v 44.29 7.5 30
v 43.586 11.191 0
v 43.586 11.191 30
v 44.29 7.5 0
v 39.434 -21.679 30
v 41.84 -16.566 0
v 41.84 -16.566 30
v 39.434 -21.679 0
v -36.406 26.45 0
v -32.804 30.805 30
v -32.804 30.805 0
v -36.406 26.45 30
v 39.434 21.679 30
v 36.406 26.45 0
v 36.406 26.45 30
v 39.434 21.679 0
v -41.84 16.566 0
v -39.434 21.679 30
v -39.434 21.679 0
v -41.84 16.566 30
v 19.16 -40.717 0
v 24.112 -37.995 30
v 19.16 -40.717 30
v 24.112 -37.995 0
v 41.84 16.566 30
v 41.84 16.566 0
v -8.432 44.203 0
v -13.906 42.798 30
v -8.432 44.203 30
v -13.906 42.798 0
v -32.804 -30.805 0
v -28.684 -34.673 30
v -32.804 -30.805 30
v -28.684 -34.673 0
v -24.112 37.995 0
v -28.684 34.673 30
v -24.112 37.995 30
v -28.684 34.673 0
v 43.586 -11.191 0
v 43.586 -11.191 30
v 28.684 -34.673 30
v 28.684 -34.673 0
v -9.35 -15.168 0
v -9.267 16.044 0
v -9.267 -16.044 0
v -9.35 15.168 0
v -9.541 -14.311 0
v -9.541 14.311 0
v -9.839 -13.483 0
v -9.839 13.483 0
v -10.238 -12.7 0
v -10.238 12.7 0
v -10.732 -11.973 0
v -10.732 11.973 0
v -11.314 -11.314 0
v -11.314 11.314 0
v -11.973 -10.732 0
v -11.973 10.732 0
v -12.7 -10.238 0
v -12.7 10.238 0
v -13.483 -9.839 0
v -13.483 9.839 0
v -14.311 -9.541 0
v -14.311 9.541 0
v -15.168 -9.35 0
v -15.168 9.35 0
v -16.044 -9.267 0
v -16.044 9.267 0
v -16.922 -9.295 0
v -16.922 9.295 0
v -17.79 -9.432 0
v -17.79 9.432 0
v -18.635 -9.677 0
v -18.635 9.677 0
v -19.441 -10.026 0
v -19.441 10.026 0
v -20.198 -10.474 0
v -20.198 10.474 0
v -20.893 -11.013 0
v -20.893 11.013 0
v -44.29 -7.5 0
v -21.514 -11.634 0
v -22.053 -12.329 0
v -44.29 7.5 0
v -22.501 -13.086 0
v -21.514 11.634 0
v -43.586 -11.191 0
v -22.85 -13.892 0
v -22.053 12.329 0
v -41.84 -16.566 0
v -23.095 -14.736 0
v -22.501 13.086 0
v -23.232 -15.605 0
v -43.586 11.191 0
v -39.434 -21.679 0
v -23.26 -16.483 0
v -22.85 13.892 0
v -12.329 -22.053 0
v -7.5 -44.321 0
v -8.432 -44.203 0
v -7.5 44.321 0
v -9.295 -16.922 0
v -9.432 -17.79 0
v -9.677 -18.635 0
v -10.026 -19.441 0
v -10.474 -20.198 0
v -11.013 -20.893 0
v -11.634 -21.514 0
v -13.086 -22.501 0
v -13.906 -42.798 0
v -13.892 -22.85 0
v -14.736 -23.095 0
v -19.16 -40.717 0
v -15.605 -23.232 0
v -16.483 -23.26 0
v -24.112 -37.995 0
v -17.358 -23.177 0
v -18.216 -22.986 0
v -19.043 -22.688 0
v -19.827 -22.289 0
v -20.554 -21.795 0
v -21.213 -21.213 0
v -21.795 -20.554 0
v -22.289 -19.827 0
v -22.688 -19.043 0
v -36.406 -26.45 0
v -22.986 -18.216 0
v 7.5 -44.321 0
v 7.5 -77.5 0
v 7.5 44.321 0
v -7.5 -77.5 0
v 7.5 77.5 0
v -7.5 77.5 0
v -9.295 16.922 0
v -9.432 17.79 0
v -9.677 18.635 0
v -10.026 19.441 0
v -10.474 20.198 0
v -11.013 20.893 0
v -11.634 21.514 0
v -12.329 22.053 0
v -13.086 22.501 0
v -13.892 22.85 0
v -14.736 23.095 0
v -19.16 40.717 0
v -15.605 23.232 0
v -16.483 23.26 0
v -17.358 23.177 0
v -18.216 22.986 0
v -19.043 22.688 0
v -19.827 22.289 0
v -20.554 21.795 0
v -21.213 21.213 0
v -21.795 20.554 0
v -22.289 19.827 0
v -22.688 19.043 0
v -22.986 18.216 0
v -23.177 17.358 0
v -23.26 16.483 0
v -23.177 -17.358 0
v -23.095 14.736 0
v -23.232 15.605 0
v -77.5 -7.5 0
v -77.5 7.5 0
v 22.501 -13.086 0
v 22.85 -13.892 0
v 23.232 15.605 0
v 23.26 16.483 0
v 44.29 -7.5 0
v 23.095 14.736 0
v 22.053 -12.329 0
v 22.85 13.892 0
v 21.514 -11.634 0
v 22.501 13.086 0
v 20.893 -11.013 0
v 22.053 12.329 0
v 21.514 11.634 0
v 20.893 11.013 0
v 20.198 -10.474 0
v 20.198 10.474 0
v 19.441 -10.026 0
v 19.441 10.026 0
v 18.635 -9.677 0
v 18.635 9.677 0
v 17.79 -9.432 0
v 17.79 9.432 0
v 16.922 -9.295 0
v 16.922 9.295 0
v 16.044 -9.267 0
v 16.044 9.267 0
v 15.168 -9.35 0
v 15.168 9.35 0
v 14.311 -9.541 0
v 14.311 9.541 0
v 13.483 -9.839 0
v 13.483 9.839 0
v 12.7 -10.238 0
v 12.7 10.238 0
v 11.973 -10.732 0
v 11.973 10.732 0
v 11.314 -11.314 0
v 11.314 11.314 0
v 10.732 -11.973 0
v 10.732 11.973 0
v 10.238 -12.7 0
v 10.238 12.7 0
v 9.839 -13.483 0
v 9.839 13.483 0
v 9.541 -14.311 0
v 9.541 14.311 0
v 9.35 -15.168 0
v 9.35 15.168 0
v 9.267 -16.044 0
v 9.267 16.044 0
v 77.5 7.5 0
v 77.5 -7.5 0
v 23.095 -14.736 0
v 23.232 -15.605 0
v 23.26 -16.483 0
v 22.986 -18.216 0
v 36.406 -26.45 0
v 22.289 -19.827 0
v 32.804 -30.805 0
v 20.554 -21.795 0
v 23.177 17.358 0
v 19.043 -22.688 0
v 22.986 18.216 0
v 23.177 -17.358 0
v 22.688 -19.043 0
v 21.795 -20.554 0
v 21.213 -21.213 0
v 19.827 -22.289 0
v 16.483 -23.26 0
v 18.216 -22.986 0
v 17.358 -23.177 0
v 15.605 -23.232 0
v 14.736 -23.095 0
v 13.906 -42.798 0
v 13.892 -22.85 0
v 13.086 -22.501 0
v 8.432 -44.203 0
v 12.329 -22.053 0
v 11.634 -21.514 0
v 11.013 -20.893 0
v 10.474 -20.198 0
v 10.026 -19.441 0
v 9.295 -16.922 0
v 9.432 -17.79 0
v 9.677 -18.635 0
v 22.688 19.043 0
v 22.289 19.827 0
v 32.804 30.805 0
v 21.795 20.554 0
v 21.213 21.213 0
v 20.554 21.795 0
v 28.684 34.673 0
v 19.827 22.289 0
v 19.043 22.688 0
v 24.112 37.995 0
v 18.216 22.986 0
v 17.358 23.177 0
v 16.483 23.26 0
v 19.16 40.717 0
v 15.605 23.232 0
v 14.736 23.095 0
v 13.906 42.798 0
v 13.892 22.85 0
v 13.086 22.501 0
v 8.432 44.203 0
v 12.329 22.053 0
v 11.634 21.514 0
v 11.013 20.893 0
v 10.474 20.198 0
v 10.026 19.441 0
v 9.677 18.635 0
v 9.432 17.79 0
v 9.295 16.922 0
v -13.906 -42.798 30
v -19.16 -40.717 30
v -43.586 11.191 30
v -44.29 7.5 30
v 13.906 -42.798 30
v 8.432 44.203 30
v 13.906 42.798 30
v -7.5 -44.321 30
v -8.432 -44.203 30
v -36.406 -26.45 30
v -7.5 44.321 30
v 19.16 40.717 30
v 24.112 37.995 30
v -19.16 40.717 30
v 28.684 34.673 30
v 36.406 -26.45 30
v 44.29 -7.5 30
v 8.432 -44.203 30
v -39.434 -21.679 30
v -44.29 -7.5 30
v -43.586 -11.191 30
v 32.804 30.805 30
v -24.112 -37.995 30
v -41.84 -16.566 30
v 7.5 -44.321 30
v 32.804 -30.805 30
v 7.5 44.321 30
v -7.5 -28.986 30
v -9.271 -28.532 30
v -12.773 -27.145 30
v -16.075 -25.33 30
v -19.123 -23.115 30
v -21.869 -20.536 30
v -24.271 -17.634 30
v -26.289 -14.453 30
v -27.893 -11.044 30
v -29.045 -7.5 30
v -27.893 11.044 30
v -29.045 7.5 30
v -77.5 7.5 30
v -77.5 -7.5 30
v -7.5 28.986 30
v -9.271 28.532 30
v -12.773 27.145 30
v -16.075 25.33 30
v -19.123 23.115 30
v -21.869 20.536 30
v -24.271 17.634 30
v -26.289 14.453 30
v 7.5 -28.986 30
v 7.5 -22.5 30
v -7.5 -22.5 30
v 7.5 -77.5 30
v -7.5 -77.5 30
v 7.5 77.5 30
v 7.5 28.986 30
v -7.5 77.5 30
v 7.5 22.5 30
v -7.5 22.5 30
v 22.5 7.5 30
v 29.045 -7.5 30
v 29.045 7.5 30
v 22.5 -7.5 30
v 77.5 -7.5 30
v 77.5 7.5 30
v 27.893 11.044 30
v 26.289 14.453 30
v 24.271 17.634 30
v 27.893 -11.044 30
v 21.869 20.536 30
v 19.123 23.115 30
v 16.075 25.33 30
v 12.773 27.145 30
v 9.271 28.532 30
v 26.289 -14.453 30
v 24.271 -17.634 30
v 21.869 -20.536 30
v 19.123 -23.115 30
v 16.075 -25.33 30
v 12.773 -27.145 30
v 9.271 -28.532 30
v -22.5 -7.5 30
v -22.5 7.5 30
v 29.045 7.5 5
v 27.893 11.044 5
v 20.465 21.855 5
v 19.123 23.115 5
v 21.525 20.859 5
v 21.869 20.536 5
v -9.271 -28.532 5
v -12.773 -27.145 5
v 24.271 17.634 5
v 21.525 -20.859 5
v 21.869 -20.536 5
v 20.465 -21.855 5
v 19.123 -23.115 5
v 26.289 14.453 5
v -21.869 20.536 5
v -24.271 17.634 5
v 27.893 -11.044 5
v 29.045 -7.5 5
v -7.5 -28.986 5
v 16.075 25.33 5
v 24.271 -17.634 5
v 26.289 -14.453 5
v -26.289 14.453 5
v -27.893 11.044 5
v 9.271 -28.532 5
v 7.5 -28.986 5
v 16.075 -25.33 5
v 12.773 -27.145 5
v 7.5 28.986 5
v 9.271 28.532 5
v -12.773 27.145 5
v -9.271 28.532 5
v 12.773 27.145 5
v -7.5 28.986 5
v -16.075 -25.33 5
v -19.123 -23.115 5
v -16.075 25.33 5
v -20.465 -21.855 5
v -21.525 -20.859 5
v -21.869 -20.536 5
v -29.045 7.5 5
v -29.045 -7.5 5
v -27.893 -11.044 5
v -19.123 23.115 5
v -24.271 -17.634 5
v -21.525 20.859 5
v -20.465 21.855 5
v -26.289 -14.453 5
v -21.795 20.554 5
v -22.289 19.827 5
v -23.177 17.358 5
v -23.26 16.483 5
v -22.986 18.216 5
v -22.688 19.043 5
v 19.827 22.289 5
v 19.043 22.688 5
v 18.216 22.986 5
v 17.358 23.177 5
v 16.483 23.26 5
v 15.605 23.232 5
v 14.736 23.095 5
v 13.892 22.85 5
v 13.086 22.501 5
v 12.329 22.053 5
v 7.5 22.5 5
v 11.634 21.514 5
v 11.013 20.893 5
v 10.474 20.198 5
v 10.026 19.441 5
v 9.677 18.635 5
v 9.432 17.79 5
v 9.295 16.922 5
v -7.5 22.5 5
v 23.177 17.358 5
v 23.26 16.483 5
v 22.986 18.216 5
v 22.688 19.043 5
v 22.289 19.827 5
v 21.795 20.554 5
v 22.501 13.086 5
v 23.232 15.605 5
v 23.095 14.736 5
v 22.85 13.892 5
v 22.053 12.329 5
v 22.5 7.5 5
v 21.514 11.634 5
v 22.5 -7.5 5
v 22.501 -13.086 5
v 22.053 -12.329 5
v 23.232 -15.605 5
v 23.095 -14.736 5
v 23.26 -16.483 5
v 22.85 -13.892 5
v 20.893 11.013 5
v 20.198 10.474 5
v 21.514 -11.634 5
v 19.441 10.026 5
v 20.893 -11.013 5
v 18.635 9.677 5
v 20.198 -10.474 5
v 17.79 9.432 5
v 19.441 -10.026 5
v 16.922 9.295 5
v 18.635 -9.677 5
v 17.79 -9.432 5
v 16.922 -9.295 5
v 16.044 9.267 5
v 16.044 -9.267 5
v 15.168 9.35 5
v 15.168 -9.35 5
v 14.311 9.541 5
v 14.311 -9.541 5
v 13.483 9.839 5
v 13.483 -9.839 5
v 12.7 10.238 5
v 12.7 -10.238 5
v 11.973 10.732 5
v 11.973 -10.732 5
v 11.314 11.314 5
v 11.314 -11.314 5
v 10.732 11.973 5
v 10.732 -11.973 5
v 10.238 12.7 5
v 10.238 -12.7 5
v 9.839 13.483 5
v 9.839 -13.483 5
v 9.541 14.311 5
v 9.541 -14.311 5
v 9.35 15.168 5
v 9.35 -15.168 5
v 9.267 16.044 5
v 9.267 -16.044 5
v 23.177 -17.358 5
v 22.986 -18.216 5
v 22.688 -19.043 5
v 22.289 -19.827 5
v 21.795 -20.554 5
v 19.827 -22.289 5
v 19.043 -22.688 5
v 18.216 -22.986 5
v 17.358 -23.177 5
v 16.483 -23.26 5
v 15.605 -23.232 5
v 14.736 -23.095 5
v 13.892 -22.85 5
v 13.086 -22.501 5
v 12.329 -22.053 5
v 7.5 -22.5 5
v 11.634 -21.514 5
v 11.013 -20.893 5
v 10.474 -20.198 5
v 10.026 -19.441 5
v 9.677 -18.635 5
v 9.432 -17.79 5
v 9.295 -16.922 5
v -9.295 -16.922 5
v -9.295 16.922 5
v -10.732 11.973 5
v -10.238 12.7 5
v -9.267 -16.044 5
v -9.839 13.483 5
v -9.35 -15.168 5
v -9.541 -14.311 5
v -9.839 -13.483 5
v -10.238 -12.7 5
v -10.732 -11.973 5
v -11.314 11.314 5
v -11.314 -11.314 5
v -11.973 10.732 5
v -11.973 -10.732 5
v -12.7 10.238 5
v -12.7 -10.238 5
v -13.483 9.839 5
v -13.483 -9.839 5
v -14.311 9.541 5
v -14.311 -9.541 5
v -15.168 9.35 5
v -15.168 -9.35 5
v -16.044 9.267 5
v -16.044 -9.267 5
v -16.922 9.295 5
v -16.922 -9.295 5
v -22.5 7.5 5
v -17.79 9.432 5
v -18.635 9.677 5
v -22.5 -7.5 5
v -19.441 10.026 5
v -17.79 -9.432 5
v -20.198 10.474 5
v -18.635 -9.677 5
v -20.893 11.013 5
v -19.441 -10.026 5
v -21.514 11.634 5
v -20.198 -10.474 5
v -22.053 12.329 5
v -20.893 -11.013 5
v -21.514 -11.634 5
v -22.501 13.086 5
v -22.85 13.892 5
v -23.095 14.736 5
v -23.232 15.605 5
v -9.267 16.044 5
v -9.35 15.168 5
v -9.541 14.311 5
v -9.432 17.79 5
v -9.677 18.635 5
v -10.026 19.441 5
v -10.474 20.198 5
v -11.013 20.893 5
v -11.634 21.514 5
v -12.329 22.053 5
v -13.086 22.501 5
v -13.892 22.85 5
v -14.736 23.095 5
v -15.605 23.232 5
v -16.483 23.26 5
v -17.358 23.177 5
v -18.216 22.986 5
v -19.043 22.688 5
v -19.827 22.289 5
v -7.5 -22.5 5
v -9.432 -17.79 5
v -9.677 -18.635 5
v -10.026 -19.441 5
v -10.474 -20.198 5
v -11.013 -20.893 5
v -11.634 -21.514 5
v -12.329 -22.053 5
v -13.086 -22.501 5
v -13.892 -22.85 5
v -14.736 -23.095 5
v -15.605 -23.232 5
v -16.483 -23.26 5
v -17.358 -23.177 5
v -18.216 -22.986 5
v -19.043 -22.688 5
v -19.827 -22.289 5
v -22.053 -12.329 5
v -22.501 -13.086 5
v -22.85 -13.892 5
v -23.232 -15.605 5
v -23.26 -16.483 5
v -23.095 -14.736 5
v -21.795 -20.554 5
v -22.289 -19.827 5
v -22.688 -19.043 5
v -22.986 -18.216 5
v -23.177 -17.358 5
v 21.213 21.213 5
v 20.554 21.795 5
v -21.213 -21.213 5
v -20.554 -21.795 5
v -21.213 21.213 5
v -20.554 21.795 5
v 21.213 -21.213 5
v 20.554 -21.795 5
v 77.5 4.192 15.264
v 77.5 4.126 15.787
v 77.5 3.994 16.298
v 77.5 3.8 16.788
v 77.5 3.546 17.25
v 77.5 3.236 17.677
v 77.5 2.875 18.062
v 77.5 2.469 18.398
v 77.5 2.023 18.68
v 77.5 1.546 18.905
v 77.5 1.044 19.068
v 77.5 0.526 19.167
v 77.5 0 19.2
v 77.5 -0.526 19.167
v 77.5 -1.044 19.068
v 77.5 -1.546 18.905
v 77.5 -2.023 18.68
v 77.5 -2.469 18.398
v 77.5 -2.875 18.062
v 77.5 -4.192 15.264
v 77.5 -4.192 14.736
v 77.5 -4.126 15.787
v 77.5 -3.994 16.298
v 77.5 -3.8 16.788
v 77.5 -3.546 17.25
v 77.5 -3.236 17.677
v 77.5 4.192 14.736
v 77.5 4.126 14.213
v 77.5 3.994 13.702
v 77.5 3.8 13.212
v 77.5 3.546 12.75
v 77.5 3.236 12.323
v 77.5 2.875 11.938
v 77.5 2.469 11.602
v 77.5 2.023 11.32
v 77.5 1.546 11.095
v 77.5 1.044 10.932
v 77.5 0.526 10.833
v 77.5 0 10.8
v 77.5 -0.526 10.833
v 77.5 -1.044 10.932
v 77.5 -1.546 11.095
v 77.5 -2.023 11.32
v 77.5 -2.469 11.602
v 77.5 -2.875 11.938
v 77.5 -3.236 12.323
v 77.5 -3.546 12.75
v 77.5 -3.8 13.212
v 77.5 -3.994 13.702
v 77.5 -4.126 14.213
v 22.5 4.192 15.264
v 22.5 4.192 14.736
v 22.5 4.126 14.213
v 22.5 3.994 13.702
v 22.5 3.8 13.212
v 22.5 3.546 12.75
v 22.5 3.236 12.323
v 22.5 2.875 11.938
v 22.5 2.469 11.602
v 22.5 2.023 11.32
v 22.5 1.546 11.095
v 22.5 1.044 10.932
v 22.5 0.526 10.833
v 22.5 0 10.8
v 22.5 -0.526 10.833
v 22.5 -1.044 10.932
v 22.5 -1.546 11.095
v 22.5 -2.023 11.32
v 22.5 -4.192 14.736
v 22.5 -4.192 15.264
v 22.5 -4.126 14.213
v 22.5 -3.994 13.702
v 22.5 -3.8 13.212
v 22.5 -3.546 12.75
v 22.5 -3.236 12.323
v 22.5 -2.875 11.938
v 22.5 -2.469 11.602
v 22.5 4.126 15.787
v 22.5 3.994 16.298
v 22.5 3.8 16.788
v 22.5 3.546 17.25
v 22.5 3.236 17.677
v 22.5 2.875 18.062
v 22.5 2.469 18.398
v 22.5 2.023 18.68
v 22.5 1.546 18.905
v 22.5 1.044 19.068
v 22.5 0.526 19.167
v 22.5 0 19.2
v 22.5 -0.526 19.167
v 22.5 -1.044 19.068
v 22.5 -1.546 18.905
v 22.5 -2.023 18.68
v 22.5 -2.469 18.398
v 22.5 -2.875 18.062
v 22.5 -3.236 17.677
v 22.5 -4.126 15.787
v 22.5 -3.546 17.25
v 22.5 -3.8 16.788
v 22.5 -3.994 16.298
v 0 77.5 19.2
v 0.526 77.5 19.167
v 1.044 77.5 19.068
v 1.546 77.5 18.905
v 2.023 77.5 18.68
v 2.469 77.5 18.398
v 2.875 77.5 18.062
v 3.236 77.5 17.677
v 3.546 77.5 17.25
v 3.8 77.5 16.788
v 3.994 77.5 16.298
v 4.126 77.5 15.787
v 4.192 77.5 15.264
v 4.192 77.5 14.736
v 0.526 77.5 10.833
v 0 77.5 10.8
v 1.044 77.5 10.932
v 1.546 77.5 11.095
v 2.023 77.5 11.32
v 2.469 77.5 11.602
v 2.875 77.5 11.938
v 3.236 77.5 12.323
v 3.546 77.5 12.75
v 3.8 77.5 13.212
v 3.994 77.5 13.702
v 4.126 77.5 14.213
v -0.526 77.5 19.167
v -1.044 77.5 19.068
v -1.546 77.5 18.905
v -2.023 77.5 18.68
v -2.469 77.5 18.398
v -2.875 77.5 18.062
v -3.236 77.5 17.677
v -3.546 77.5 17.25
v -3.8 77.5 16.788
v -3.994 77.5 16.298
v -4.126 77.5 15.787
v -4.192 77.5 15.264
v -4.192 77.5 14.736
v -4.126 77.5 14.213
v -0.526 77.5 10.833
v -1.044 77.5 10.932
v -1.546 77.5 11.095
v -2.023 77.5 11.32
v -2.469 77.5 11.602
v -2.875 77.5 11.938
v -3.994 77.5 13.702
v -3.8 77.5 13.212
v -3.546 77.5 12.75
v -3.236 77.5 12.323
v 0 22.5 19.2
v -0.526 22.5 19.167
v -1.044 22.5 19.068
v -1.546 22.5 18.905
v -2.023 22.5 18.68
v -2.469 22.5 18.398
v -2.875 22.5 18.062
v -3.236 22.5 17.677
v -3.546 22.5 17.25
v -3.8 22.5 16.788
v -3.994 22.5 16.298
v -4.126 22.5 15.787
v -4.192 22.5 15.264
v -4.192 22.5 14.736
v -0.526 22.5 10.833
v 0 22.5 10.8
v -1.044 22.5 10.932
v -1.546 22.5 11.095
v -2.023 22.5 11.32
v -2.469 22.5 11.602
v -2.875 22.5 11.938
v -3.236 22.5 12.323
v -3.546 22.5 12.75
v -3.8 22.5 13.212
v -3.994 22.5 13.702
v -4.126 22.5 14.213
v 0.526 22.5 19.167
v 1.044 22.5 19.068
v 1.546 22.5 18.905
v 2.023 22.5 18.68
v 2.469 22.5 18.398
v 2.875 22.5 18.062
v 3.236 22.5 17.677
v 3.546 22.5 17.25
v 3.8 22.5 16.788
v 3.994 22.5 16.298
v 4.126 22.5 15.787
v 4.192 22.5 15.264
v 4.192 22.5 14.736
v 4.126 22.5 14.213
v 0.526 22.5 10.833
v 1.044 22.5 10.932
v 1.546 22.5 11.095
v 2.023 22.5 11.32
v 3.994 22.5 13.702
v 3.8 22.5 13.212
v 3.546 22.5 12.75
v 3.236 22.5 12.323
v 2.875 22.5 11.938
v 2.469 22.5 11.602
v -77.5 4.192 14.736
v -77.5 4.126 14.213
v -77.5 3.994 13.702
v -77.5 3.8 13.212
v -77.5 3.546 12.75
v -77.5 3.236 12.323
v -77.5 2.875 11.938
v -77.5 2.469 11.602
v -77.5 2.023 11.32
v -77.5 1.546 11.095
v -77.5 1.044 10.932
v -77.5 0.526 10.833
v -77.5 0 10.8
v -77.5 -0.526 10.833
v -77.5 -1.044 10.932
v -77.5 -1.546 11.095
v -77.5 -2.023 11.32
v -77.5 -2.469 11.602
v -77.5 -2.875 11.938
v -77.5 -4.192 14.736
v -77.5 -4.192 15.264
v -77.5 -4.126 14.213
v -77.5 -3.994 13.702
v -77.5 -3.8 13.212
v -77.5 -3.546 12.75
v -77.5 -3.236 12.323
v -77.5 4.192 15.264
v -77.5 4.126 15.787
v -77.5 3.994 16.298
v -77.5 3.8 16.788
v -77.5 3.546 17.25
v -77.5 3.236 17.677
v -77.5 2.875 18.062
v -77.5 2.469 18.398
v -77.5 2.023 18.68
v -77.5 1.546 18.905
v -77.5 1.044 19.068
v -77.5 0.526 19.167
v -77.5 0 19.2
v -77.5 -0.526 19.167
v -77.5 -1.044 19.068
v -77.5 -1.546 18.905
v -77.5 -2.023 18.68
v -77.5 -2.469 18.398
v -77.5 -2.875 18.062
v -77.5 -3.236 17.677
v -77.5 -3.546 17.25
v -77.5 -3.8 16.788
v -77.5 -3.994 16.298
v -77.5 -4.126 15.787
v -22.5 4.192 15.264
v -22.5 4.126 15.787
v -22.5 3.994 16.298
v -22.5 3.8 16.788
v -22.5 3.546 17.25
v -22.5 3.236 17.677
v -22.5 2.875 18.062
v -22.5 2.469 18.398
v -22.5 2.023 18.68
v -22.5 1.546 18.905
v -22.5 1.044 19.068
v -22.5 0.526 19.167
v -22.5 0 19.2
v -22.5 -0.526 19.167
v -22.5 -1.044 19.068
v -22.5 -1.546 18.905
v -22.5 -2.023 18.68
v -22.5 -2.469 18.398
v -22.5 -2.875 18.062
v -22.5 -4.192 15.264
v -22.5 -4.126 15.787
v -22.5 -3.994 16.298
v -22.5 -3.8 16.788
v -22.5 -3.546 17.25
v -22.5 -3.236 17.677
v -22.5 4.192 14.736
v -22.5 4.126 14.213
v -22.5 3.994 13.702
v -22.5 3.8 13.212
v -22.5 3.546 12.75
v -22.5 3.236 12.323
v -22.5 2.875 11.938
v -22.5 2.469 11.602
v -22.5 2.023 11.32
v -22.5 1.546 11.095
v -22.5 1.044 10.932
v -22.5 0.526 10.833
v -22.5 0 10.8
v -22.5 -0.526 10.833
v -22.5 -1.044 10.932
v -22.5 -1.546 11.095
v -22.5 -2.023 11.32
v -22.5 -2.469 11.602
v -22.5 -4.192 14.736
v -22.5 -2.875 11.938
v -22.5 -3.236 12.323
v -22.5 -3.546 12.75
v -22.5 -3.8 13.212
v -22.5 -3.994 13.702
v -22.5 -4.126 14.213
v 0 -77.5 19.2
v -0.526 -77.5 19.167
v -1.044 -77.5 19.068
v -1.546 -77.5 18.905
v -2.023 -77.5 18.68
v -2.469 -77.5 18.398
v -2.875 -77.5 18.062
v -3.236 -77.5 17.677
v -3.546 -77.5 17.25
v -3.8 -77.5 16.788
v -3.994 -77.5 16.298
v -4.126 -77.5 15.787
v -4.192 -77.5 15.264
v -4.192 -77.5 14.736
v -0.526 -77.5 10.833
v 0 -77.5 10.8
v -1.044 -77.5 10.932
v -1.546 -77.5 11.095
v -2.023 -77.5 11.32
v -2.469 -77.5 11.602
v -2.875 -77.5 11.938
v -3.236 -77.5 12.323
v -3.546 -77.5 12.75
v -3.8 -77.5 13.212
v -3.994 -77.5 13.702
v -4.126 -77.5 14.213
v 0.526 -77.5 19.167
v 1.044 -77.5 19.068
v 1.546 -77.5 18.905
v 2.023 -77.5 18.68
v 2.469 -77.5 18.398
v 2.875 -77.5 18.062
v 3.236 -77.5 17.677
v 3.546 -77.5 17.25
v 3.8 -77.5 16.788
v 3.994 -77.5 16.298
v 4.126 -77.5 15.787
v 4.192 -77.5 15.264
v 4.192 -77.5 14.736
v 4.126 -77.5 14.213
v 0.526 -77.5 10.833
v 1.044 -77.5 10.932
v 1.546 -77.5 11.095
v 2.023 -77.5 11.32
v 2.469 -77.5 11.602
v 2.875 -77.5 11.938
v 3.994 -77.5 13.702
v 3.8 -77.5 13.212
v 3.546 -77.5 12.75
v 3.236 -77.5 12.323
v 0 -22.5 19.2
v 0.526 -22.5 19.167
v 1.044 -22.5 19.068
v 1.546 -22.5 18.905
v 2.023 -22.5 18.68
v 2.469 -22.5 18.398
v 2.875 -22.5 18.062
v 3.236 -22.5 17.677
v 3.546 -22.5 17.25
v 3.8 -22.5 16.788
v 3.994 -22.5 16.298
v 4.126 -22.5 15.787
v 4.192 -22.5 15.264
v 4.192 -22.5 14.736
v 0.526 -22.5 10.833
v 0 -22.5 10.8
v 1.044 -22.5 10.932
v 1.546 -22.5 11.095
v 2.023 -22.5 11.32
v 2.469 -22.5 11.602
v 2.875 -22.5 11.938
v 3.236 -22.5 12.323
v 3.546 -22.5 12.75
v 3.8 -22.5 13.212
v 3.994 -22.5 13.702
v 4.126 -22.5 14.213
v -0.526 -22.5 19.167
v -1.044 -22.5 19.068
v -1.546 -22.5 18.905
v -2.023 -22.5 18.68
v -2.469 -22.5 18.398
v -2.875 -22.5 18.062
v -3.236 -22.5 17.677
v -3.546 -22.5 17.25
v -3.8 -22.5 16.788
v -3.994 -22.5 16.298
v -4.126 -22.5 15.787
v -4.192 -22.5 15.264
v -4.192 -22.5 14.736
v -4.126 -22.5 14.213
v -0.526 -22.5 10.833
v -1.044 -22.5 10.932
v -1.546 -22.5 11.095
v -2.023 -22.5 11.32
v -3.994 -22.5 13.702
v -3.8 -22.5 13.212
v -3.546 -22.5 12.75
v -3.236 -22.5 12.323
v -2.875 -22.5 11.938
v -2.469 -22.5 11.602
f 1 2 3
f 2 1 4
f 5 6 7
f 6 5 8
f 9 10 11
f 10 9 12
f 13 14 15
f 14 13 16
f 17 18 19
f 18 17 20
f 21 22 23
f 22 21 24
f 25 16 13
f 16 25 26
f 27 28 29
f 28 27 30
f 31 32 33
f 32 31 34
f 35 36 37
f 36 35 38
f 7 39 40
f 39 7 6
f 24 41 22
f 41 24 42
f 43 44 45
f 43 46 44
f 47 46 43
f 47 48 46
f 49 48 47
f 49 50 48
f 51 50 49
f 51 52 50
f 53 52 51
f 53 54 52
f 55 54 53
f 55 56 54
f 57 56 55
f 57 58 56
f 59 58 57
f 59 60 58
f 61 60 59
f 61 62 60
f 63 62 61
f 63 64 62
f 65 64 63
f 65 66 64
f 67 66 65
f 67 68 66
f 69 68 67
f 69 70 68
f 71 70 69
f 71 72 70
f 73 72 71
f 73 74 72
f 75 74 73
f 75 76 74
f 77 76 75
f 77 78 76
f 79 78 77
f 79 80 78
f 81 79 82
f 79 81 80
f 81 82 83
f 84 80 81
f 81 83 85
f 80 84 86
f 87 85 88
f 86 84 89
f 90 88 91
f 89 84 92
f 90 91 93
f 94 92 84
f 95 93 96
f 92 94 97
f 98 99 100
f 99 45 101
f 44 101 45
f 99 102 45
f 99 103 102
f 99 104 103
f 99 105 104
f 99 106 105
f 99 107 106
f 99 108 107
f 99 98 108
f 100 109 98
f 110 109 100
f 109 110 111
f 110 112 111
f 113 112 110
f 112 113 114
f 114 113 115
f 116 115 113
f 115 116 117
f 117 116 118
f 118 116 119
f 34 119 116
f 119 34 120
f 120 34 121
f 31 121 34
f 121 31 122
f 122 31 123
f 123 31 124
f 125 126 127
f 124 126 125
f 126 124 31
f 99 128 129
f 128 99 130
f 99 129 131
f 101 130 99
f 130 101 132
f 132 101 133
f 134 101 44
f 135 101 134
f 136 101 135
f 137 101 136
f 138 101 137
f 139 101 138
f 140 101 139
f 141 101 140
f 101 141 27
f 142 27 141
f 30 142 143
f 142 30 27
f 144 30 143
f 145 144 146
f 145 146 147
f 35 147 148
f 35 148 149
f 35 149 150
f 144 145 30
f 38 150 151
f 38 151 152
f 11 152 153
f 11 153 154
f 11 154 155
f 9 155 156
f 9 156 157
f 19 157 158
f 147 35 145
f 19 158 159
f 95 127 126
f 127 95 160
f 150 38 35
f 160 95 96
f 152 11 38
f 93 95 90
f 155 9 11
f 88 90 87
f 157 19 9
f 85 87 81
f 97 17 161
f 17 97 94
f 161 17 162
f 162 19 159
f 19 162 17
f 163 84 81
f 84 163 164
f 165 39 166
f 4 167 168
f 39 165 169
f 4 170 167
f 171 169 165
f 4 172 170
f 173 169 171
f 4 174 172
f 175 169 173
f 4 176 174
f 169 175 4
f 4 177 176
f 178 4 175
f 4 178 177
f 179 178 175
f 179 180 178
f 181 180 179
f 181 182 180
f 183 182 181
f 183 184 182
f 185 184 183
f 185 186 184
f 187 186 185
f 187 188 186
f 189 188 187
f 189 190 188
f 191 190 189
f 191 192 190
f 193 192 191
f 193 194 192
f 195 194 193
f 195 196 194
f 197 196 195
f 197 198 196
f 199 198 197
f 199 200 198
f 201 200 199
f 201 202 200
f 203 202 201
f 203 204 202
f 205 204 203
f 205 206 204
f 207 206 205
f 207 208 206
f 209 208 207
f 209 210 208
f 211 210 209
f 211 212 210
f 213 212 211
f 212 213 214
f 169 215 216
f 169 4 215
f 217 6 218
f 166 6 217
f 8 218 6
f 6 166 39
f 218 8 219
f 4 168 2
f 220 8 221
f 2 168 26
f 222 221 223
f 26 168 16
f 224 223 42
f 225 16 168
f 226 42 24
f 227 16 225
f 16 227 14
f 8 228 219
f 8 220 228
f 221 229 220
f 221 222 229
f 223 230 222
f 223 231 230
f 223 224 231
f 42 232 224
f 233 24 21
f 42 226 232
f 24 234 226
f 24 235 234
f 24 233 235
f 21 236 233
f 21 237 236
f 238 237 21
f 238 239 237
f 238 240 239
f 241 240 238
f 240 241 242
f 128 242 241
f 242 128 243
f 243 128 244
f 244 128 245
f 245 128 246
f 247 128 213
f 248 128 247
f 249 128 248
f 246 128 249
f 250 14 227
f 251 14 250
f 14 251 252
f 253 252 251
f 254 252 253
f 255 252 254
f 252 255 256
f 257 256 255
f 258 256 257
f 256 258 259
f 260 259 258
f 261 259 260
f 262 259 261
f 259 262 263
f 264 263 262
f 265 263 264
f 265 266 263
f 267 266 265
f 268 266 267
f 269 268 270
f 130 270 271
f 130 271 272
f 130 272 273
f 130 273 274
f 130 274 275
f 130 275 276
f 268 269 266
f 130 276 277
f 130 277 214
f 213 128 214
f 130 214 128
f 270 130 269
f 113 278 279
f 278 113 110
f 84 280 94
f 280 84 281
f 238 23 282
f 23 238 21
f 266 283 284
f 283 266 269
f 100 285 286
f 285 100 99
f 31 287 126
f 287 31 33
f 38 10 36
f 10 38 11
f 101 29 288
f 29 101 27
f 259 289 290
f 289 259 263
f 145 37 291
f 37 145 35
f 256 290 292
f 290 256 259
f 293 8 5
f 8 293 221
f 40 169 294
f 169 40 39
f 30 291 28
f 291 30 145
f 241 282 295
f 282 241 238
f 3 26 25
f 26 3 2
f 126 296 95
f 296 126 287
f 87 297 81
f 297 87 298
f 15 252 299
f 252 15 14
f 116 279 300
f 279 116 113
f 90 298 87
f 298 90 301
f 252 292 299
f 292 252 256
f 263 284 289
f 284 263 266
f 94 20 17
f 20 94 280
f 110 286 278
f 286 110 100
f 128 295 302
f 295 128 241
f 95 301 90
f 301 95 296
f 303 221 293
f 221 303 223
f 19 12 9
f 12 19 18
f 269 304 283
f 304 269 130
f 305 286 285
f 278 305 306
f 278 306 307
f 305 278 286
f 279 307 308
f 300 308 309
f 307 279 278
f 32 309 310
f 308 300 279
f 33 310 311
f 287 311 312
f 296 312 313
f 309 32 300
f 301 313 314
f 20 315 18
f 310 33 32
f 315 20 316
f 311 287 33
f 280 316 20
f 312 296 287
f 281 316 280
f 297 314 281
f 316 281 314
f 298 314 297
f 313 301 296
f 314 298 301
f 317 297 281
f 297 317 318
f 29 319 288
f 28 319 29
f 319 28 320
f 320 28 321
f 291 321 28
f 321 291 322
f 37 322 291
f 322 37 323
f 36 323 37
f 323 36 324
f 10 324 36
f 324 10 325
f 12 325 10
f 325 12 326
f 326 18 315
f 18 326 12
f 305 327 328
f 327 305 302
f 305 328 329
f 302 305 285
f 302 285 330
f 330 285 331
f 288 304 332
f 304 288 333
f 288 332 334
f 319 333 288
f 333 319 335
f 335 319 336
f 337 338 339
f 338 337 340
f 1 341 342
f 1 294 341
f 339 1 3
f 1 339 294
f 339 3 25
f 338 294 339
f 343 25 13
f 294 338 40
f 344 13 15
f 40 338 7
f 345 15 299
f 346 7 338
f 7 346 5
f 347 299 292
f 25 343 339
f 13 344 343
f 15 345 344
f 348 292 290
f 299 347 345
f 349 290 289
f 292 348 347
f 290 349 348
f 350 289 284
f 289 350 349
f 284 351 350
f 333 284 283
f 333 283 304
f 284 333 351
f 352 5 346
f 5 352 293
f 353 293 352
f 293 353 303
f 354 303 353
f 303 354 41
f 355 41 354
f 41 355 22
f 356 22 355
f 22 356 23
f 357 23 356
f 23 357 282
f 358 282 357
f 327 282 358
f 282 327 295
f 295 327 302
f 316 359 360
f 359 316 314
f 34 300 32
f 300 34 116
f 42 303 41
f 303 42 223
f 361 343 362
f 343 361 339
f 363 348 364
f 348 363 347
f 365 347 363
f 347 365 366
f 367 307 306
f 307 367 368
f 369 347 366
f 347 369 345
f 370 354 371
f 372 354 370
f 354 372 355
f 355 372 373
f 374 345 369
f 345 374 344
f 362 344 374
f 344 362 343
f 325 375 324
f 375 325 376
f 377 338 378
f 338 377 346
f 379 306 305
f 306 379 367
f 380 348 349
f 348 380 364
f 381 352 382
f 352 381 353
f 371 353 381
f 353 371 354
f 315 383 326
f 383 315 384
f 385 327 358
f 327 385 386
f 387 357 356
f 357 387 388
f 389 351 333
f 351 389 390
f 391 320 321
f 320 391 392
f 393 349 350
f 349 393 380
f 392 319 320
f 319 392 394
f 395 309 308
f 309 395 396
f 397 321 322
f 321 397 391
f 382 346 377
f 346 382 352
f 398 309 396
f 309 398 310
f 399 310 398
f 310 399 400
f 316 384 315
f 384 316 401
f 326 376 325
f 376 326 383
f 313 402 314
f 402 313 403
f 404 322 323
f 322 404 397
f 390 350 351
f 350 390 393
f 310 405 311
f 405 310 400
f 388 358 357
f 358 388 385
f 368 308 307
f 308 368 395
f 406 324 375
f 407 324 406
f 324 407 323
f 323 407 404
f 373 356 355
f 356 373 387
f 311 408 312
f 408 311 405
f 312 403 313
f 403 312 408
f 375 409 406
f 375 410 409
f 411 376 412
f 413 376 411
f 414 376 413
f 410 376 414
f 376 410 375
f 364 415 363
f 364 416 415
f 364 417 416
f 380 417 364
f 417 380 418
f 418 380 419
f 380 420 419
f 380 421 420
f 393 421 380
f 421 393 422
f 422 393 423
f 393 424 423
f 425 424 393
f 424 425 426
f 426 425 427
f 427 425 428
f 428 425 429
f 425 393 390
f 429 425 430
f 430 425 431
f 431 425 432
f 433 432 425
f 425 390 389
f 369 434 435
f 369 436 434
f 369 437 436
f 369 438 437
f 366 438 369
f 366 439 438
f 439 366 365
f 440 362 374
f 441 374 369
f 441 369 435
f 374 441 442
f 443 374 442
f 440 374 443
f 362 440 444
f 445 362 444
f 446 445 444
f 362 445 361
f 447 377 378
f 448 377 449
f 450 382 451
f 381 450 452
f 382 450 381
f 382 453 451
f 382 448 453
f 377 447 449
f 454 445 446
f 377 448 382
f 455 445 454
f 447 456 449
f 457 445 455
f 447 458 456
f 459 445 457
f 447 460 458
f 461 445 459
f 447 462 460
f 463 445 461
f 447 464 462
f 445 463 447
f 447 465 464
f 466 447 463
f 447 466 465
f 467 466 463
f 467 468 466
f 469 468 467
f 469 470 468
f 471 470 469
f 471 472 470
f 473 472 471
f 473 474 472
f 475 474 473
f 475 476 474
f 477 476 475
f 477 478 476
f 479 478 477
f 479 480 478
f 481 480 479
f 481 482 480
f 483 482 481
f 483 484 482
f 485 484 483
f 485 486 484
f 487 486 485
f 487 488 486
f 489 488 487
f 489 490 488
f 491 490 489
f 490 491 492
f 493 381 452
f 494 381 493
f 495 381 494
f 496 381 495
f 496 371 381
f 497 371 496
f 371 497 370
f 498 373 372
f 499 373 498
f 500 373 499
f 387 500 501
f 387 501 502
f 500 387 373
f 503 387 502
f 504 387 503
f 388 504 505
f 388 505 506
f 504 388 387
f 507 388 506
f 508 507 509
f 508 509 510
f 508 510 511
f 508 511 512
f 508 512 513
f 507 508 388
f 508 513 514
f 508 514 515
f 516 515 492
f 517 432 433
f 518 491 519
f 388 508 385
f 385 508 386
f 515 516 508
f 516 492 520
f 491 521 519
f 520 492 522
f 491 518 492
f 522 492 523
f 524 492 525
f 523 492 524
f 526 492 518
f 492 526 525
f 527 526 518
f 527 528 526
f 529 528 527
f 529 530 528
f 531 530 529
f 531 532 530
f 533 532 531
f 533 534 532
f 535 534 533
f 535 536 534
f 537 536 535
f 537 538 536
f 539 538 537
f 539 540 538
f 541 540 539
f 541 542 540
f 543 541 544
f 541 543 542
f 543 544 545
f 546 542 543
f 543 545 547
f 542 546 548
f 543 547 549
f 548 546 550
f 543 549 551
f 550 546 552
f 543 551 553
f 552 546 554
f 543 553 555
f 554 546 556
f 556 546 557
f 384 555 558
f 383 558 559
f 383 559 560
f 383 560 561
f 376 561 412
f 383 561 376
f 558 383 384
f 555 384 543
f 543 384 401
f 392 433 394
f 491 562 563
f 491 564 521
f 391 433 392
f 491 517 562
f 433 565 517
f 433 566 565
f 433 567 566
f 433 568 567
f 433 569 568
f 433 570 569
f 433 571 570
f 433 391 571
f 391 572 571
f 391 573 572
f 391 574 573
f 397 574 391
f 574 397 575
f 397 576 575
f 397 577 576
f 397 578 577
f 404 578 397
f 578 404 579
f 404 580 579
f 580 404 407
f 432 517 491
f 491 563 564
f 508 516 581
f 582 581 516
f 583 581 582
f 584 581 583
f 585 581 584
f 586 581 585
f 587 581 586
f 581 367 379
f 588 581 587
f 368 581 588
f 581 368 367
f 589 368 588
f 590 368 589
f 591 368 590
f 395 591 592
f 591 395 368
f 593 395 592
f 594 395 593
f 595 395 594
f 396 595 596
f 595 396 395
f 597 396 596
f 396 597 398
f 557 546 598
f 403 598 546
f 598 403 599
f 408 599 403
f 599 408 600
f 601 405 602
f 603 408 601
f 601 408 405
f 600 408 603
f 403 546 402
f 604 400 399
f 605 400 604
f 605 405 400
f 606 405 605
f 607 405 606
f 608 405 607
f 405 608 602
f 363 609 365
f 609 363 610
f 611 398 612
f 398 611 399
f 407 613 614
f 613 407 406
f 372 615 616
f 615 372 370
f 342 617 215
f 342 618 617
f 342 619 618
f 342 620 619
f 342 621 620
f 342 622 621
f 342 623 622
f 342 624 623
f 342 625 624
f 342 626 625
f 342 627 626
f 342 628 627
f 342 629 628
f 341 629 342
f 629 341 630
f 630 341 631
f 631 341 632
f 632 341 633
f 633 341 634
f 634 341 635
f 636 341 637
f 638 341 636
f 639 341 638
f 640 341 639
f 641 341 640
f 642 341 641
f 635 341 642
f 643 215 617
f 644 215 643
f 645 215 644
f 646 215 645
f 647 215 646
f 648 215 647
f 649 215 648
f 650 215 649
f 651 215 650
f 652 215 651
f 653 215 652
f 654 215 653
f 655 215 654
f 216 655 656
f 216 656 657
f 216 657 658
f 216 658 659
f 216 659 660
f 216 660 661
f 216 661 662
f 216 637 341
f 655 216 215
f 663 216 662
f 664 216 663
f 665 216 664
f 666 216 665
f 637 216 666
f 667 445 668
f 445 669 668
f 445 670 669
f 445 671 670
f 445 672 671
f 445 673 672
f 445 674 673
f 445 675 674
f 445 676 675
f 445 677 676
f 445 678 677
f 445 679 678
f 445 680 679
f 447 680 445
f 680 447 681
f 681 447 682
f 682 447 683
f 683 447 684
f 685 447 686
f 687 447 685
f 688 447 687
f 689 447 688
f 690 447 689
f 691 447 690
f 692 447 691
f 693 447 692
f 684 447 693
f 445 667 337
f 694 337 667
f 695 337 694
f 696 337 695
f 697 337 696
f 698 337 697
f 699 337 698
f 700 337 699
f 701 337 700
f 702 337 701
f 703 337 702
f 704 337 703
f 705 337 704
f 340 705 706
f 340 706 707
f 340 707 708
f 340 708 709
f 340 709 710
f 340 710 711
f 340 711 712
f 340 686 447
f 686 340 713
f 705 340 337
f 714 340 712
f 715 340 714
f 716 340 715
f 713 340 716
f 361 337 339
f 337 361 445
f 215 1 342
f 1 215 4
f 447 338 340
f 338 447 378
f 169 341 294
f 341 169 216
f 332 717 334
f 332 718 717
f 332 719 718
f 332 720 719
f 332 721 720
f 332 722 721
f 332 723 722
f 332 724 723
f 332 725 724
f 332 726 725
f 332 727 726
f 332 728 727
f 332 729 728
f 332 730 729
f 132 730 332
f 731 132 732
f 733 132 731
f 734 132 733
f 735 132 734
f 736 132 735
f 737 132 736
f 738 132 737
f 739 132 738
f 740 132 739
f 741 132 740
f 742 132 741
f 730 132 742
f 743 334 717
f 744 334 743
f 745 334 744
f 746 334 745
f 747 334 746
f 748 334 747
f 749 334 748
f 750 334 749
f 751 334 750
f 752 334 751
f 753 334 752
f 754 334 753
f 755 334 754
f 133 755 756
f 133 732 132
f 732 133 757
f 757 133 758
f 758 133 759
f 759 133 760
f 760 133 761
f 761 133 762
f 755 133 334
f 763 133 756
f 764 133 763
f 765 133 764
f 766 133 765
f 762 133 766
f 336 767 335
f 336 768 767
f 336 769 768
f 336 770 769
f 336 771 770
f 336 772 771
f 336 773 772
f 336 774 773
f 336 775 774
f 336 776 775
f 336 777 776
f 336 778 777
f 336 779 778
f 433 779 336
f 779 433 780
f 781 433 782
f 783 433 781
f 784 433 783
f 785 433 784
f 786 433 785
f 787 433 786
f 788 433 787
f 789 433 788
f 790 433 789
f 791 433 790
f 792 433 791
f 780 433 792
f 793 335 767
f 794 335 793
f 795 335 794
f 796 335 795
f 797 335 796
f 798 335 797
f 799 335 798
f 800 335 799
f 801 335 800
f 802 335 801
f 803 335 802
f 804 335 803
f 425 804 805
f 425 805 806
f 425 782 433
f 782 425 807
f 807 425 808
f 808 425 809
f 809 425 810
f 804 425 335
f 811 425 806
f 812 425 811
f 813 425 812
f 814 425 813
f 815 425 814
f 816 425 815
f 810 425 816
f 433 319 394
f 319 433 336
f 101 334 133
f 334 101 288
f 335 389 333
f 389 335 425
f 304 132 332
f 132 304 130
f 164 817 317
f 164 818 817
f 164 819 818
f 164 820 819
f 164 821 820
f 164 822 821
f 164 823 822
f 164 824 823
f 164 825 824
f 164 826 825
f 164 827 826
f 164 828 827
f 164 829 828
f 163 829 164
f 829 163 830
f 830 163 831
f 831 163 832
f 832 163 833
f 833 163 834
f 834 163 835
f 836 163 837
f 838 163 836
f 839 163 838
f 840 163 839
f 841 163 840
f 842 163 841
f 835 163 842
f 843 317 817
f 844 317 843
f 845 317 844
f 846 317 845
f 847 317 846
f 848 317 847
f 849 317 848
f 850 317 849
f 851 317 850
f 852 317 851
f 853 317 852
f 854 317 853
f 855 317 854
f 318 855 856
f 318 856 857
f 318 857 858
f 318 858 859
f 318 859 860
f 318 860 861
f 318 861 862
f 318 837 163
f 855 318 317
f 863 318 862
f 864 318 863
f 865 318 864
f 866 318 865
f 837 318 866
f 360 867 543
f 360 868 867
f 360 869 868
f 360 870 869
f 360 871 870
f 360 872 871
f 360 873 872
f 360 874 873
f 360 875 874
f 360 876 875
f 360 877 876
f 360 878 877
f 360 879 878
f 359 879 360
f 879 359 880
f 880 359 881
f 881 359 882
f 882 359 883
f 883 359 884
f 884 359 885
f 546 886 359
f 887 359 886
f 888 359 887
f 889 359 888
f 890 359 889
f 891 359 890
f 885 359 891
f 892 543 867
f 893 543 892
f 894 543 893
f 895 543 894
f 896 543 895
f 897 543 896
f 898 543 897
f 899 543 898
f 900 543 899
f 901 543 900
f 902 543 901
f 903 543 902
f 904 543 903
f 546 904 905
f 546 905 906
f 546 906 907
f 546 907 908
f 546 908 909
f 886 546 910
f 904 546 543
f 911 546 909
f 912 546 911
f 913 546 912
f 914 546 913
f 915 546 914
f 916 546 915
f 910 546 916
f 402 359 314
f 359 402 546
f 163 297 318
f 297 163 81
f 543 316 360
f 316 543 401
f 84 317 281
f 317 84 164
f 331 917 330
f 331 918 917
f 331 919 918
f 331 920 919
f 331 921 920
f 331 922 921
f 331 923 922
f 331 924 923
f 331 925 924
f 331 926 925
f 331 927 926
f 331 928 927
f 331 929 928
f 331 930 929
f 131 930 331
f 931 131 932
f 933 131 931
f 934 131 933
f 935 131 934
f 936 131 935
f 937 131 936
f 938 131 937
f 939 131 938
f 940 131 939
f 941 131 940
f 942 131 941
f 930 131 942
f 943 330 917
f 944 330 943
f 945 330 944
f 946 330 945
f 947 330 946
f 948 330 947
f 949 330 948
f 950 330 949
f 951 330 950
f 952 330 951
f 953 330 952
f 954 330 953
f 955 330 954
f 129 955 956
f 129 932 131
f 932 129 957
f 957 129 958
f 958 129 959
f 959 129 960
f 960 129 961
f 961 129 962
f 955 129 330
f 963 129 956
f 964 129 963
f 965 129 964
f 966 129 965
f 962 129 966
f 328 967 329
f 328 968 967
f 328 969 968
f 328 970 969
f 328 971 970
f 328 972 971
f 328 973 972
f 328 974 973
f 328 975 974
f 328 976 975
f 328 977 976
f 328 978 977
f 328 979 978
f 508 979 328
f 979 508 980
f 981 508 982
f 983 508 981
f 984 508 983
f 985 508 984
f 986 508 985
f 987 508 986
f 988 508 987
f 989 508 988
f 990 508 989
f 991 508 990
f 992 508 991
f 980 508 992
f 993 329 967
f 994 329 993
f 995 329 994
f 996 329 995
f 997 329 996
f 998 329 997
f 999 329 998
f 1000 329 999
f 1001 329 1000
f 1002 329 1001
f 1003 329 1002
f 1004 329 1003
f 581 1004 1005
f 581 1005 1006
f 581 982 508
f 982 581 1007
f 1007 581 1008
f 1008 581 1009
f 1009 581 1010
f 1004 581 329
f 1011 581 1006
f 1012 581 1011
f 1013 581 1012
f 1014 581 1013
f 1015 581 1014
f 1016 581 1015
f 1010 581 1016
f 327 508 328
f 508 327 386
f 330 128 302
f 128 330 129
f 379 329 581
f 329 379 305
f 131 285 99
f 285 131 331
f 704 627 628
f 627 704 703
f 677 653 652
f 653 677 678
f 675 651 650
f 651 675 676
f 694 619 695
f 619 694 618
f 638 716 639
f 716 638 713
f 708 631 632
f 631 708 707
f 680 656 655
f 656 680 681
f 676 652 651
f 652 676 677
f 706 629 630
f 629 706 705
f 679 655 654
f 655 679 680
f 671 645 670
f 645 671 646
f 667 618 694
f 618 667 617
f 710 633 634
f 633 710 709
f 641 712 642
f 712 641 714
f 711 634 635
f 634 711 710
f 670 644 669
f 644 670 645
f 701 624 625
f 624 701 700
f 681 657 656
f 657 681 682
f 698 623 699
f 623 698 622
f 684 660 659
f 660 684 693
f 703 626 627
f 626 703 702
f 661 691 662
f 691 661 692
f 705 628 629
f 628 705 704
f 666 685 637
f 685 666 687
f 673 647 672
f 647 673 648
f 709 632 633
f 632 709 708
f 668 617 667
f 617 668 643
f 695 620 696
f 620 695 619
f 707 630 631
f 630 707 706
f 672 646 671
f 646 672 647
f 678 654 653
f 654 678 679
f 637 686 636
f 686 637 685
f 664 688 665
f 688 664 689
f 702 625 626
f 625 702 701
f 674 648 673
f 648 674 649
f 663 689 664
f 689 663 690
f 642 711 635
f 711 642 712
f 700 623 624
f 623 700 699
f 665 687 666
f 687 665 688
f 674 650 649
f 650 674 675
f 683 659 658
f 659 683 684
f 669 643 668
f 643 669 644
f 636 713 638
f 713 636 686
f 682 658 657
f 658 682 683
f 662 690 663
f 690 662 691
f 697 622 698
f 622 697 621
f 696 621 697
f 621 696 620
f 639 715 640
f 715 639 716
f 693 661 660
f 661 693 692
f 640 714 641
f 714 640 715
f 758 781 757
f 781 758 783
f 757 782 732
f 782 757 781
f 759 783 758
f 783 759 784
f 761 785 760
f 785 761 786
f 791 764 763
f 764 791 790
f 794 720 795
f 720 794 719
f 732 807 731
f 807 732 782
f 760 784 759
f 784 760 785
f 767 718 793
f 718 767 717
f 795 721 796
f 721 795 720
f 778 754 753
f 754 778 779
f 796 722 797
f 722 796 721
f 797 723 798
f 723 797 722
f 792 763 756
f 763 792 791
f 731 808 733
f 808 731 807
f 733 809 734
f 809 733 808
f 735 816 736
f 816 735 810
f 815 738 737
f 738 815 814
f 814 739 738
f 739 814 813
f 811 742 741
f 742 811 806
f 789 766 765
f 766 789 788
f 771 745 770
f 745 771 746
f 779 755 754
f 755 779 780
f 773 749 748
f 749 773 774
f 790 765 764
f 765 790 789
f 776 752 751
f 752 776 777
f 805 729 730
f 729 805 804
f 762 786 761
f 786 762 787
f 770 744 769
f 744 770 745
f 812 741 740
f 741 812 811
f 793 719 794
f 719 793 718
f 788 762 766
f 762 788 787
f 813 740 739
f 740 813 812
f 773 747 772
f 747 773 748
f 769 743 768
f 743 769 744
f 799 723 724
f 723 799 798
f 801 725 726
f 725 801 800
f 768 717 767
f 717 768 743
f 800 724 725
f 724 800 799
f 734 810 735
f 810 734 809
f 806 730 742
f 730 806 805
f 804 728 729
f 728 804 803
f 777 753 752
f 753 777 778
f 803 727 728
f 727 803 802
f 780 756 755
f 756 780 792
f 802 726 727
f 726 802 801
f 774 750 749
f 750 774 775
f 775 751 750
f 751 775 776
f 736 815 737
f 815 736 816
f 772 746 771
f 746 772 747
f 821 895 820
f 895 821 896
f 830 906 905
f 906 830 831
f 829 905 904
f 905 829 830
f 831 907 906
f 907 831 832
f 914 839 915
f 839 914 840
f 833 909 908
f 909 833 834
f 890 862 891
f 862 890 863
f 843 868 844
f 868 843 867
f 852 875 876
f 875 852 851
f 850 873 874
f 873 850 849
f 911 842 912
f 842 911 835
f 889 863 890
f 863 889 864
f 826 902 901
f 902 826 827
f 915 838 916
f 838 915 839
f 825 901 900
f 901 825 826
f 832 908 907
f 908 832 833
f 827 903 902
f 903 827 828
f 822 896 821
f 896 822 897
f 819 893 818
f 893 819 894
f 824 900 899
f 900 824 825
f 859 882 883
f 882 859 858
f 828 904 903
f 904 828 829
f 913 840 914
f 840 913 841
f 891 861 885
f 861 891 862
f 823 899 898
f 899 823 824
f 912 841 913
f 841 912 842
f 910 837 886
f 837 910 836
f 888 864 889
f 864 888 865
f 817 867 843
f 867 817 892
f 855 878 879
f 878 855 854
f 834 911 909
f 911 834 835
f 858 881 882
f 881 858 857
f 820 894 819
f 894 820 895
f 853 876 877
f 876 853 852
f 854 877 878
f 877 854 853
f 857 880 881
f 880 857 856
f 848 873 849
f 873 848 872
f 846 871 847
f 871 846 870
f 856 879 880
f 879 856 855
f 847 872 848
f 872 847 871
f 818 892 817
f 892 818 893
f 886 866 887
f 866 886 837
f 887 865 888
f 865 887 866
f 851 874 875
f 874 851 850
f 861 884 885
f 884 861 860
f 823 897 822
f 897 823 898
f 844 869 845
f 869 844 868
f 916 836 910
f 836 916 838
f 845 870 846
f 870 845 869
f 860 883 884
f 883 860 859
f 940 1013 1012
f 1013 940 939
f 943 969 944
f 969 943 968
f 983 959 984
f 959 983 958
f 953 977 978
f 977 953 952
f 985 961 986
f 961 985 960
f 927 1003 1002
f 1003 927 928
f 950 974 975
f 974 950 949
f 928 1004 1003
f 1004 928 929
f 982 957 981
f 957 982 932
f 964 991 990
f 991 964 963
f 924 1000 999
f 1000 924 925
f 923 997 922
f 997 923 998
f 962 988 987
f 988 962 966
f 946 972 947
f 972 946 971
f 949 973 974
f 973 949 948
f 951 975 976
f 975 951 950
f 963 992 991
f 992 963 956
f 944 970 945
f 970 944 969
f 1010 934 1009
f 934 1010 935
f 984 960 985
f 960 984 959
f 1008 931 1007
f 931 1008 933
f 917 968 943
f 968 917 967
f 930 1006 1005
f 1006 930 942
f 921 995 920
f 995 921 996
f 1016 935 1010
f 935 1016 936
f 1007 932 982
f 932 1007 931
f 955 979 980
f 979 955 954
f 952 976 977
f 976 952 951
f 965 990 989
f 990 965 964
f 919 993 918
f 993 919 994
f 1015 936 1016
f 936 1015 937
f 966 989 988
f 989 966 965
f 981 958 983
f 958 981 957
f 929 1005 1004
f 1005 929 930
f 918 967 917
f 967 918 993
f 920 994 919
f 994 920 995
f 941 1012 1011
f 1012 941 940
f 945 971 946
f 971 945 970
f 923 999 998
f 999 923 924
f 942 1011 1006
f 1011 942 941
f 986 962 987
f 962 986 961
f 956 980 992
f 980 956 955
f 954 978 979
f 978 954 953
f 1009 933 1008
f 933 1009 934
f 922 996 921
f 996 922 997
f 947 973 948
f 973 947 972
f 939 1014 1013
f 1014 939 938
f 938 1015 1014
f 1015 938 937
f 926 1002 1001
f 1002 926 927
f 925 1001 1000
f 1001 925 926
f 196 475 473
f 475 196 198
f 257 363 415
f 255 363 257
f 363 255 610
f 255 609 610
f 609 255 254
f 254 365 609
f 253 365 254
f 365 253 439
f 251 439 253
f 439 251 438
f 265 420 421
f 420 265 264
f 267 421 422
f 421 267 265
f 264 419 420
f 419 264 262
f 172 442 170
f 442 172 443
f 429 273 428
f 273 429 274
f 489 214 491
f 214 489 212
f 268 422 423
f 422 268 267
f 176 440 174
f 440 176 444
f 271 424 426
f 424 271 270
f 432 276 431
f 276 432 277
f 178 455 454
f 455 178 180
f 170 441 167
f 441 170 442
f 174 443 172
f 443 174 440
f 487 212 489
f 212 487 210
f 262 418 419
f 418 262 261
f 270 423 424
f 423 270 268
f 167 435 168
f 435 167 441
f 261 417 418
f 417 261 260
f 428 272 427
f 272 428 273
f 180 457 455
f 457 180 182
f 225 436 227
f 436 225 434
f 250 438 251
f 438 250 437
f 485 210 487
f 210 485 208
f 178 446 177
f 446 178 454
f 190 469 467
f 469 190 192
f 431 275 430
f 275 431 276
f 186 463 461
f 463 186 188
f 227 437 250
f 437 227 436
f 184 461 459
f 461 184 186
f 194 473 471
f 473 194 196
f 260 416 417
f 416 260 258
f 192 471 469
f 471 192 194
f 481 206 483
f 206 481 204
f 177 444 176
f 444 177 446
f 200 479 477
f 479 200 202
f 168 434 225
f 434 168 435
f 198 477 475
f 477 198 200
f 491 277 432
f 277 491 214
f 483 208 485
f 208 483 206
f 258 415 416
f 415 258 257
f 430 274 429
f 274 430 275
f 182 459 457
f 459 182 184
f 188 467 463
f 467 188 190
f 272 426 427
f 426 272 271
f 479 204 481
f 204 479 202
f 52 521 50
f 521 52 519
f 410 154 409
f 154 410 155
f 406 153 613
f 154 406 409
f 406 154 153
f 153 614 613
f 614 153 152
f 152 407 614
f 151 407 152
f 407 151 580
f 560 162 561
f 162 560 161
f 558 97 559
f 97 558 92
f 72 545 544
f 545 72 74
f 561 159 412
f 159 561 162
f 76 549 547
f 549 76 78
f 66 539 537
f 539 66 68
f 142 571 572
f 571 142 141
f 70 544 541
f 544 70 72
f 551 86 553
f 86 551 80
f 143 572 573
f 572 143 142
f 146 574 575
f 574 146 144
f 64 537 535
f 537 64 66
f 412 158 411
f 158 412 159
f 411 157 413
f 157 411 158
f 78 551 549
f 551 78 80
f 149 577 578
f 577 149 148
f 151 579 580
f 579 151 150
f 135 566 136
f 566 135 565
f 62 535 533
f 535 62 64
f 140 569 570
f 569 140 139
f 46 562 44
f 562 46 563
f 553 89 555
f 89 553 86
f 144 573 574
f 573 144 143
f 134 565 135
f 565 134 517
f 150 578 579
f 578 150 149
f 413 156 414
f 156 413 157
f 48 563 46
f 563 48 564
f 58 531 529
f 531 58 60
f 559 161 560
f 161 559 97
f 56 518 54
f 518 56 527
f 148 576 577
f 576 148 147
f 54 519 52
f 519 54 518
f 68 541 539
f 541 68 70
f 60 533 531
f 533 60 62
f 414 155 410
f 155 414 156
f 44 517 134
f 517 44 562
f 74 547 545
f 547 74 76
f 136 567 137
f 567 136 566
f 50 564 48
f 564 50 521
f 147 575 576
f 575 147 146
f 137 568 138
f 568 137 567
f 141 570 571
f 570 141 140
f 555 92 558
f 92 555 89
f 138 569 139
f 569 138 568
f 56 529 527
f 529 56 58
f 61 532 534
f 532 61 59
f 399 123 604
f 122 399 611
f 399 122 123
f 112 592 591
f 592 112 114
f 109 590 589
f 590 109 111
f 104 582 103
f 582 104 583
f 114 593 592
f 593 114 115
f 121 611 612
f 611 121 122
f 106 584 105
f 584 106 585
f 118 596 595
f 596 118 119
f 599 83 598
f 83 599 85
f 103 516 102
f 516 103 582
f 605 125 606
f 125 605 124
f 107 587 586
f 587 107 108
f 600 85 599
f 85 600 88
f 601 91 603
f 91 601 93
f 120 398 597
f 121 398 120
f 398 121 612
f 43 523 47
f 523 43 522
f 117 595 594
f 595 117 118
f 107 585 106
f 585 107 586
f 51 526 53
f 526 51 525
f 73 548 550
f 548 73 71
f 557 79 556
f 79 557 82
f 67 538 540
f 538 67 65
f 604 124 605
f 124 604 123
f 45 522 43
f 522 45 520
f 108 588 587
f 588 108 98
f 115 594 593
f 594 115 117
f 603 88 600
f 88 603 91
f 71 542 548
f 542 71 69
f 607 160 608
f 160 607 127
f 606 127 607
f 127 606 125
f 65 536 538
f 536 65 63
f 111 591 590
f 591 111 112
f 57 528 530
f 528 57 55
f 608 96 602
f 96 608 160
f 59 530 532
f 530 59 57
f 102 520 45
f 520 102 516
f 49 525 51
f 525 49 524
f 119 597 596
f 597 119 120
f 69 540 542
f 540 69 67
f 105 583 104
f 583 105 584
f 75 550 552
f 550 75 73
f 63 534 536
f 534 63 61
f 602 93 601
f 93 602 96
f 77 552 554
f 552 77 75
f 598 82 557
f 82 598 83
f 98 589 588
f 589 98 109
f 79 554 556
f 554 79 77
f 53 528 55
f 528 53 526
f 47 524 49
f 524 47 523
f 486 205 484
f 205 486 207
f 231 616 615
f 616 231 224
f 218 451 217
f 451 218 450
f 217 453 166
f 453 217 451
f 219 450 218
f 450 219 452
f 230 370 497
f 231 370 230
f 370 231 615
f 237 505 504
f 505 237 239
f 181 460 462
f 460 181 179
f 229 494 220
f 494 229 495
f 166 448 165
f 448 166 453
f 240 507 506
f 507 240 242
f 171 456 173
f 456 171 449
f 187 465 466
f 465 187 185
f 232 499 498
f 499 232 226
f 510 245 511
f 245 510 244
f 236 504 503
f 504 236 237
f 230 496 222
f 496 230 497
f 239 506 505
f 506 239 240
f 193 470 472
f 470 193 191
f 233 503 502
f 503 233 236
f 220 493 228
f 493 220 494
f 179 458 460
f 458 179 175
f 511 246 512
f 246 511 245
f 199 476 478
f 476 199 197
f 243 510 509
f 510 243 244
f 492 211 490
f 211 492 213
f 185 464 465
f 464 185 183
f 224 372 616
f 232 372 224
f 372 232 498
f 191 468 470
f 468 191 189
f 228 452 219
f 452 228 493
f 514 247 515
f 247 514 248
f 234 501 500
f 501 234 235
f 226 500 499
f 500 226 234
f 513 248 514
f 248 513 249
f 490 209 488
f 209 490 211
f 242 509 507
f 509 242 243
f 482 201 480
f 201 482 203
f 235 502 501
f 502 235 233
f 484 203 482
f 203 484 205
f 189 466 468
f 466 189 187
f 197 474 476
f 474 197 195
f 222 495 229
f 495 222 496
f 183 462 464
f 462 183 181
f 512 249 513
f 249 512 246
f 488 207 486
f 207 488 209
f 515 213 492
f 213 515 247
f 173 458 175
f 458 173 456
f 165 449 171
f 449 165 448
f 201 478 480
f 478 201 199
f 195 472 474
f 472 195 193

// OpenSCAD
//------------------------------------------------
// 1 - Turnstile Antenna head - actual head part
//
// author: Alessandro Paganelli 
// e-mail: alessandro.paganelli@gmail.com
// github: https://github.com/allep
// license: GPL-3.0-or-later
// 
// Description
// This is the lower part of the antenna head.
//
// All sizes are expressed in mm.
//------------------------------------------------

// Set face number to a sufficiently high number.
$fn = 50;

//------------------------------------------------
// Debug mode
// Set DEBUG_MODE to 1 to simulate the actual 
// screw positions, to validate the design.
DEBUG_MODE = 0;

//------------------------------------------------
// Variables

// Screws
// M3 screws - 1.5 + 5% tolerance
SCREW_RADIUS = 1.575;

// Antenna elements
// 4mm +5% tolerance
ANENNA_ELEMENT_EXTERNAL_RADIUS = 4.2;

ANTENNA_ELEMENT_HOLDER_LENGTH = 55.0;
ANTENNA_ELEMENT_HOLDER_THICKNESS = 15.0;
ANTENNA_ELEMENT_SIDE_DISPLACEMENT = 12.5;

// Cables holes
CABLE_HOLE_RADIUS = 7.0;

// Body
CYLINDER_RADIUS_INNER = 30.0;
CYLINDER_SIDE_THICKNESS = 15.0;
CYLINDER_INNER_HEIGHT = 25.0;
CYLINDER_BASE_THICKNESS = 5.0;

//------------------------------------------------
// Modules

module cylinder_body(inner_radius, side_thickness, inner_height, base_thickness) {
    outer_radius = inner_radius + side_thickness;
    outer_height = inner_height + base_thickness;
    difference() {
        cylinder(h = outer_height, r = outer_radius);
        translate([0, 0, base_thickness])
        cylinder(h = inner_height, r = inner_radius);
    }
}

module single_antenna_holder_body(length, thickness, height) {
    translate([0, 0, height/2])
    cube(size = [length, thickness, height], center = true);
}

module antenna_holders_bodies(length, thickness, height, displacement) {
    translate([displacement, 0, 0])
    single_antenna_holder_body(length, thickness, height);
    
    rotate([0, 0, 90])
    translate([displacement, 0, 0])
    single_antenna_holder_body(length, thickness, height);
    
    rotate([0, 0, 180])
    translate([displacement, 0, 0])
    single_antenna_holder_body(length, thickness, height);
    
    rotate([0, 0, 270])
    translate([displacement, 0, 0])
    single_antenna_holder_body(length, thickness, height);
}

// To be subtracted from the assembly
module antenna_elements_holes(hole_length, hole_radius, height, displacement) {
    translate([displacement, 0, height])
    rotate([0, 90, 0])
    cylinder(h = hole_length, r = hole_radius, center = true);
    
    rotate([0, 0, 90])
    translate([displacement, 0, height])
    rotate([0, 90, 0])
    cylinder(h = hole_length, r = hole_radius, center = true);
    
    rotate([0, 0, 180])
    translate([displacement, 0, height])
    rotate([0, 90, 0])
    cylinder(h = hole_length, r = hole_radius, center = true);

    rotate([0, 0, 270])
    translate([displacement, 0, height])
    rotate([0, 90, 0])
    cylinder(h = hole_length, r = hole_radius, center = true);    
}

// To be subtracted from the assembly
module cable_holes(hole_radius, displacement, height) {
    rotate([0, 0, 45])
    translate([displacement, 0, height/2])
    cylinder(h = height, r = hole_radius, center = true);
    
    rotate([0, 0, 135])
    translate([displacement, 0, height/2])
    cylinder(h = height, r = hole_radius, center = true);

    rotate([0, 0, 225])
    translate([displacement, 0, height/2])
    cylinder(h = height, r = hole_radius, center = true);

    rotate([0, 0, 315])
    translate([displacement, 0, height/2])
    cylinder(h = height, r = hole_radius, center = true);
}

// To be subtracted from the assembly
module screw_holes() {
    // TODO
}

// To be subtracted from the assembly
module boom_connector() {
    // TODO
}

//------------------------------------------------
// Actual script

side_displacement = CYLINDER_RADIUS_INNER + CYLINDER_SIDE_THICKNESS/2 + ANTENNA_ELEMENT_SIDE_DISPLACEMENT;

if (DEBUG_MODE == 0) {
    difference() {
        union() {
            cylinder_body(CYLINDER_RADIUS_INNER, CYLINDER_SIDE_THICKNESS, CYLINDER_INNER_HEIGHT, CYLINDER_BASE_THICKNESS);
            antenna_holders_bodies(ANTENNA_ELEMENT_HOLDER_LENGTH, ANTENNA_ELEMENT_HOLDER_THICKNESS, CYLINDER_INNER_HEIGHT + CYLINDER_BASE_THICKNESS, side_displacement);
        }
        antenna_elements_holes(ANTENNA_ELEMENT_HOLDER_LENGTH, ANENNA_ELEMENT_EXTERNAL_RADIUS, (CYLINDER_INNER_HEIGHT + CYLINDER_BASE_THICKNESS)/2, side_displacement);
        cable_holes(CABLE_HOLE_RADIUS, CYLINDER_RADIUS_INNER - CABLE_HOLE_RADIUS, CYLINDER_BASE_THICKNESS);
    }
}
else {
    cable_holes(CABLE_HOLE_RADIUS, CYLINDER_RADIUS_INNER - CABLE_HOLE_RADIUS, CYLINDER_BASE_THICKNESS);
}
